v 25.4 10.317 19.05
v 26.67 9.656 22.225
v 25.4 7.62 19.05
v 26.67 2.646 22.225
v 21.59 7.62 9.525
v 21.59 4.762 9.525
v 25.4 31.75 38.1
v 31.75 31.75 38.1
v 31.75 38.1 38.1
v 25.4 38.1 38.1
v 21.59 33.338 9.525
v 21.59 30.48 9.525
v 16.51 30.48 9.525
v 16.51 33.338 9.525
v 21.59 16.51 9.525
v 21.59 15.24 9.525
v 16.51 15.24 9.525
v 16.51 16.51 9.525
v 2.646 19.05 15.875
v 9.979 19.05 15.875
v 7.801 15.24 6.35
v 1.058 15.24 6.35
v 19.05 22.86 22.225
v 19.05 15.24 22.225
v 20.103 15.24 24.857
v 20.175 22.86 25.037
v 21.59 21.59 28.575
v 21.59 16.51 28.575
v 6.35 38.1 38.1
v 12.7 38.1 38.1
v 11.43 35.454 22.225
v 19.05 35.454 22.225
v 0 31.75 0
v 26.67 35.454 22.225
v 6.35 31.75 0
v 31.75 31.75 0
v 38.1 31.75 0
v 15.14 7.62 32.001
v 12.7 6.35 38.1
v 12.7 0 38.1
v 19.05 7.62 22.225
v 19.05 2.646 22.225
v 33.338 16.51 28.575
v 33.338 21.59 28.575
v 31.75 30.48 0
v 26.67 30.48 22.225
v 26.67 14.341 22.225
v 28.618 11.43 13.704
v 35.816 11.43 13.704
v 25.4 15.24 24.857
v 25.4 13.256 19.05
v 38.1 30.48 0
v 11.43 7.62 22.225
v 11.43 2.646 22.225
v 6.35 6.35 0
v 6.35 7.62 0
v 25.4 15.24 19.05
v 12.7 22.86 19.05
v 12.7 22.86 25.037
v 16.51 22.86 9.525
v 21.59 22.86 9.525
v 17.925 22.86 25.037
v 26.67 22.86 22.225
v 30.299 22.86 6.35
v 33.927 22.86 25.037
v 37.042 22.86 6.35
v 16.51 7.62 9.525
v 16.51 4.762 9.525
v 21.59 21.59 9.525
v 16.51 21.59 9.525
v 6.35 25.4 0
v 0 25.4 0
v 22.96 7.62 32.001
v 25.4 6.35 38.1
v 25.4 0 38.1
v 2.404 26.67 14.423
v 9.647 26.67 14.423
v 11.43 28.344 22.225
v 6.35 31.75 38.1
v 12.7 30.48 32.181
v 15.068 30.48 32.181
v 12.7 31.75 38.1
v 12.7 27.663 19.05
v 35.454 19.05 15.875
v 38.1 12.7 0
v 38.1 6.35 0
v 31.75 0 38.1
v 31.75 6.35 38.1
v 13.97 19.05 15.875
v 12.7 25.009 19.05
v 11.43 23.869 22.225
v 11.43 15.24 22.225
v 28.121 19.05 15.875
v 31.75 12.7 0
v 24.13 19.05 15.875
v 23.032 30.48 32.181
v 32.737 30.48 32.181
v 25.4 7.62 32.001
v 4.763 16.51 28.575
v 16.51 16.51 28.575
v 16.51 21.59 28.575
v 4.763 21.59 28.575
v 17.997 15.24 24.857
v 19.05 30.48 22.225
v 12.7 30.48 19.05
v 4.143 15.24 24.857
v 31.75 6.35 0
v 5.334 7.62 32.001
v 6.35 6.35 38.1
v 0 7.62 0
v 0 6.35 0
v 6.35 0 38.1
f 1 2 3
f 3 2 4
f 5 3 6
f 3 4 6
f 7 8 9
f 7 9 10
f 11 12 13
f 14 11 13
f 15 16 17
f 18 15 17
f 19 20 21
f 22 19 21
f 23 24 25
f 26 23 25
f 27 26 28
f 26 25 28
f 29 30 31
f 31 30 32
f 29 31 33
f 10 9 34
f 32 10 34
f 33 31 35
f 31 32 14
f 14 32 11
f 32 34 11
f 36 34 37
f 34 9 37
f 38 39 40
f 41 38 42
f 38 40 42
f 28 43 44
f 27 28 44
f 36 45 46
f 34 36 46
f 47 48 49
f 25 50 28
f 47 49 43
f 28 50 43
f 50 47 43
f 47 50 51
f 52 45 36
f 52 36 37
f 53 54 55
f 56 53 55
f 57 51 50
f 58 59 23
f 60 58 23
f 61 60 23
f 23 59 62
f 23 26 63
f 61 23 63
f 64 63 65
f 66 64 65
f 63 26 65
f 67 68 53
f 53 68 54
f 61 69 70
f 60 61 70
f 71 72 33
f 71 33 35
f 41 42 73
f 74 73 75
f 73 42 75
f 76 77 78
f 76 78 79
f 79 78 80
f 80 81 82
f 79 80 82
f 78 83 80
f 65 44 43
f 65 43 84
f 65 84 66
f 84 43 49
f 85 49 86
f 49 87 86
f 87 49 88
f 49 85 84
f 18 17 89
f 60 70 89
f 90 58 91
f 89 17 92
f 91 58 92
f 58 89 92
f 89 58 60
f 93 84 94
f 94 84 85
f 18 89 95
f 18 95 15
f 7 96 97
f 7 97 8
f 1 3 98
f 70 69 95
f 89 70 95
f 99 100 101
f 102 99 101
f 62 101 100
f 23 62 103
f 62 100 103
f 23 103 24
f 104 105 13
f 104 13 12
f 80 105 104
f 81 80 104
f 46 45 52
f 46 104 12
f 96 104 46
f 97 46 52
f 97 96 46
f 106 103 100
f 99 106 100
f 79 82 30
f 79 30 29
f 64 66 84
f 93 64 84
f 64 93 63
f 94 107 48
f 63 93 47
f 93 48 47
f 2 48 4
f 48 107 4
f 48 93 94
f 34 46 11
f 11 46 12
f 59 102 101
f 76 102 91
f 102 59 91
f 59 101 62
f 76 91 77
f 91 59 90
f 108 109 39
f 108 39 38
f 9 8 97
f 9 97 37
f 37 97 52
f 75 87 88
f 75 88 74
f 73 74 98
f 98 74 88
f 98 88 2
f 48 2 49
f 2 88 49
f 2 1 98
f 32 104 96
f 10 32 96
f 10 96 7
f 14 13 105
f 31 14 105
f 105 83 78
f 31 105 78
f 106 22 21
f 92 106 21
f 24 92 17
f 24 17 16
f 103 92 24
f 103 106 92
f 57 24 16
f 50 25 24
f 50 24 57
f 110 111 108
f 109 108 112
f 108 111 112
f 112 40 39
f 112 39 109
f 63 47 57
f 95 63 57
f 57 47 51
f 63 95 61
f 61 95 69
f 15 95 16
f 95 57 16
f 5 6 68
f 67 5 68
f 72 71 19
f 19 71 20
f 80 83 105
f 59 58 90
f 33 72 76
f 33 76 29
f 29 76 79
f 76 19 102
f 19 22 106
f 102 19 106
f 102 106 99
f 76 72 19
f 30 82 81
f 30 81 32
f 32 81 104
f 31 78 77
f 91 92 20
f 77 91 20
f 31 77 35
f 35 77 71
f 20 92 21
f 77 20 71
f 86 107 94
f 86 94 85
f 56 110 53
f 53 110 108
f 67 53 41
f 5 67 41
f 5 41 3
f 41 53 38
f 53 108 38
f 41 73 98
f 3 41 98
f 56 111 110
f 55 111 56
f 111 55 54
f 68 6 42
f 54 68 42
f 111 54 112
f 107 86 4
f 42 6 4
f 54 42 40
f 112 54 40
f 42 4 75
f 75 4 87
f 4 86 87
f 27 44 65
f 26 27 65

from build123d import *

# Parameters (mm, degrees)
F1_DEPTH = 38.1
F6_DEPTH = 38.1
F7_DEPTH = 38.1
F8_W     = 25.4
F8_H     = 7.62
F9_DEPTH = 38.1


with BuildPart() as f1:
    # F0 (on Front) → F1 (new body)
    with BuildSketch(Plane.XZ):
        Polygon((6.35, 38.1), (0, 0), (6.35, 0), (11.43, 22.225), (16.51, 9.525), (21.59, 9.525), (26.67, 22.225), (31.75, 0), (38.1, 0), (31.75, 38.1), (25.4, 38.1), (19.05, 22.225), (12.7, 38.1), align=None)
        Polygon((0, 38.1), (0, 0), (6.35, 38.1), align=None)
        Polygon((11.43, 22.225), (6.35, 0), (31.75, 0), (26.67, 22.225), (21.59, 9.525), (16.51, 9.525), align=None)
        Polygon((25.4, 38.1), (12.7, 38.1), (19.05, 22.225), align=None)
        Polygon((31.75, 38.1), (38.1, 0), (38.1, 38.1), align=None)
    extrude(amount=-F1_DEPTH)

    # F5 (on offset) → F6 (cut)
    with BuildSketch(Plane.YZ.offset(38.1)):
        Polygon((31.75, 38.1), (6.35, 38.1), (11.43, 13.704411), (16.51, 28.575), (21.59, 28.575), (26.67, 14.422566), align=None)
        Polygon((0, 38.1), (0, 0), (6.35, 0), align=None)
        Polygon((19.05, 15.875), (12.7, 0), (25.4, 0), align=None)
        Polygon((38.1, 0), (38.1, 38.1), (31.75, 0), align=None)
    extrude(amount=-F6_DEPTH, mode=Mode.SUBTRACT)

    # F0 (on Front) → F7 (cut)
    with BuildSketch(Plane.XZ):
        Polygon((0, 38.1), (0, 0), (6.35, 38.1), align=None)
        Polygon((25.4, 38.1), (12.7, 38.1), (19.05, 22.225), align=None)
        Polygon((31.75, 38.1), (38.1, 0), (38.1, 38.1), align=None)
        Polygon((11.43, 22.225), (6.35, 0), (31.75, 0), (26.67, 22.225), (21.59, 9.525), (16.51, 9.525), align=None)
    extrude(amount=-F7_DEPTH, mode=Mode.SUBTRACT)

    # F8 (on offset) → F9 (cut)
    with BuildSketch(Plane.XY.offset(38.1)):
        with Locations((25.4, 26.67)):
            Rectangle(F8_W, F8_H)
        with Locations((12.7, 11.43)):
            Rectangle(F8_W, F8_H)
    extrude(amount=-F9_DEPTH, mode=Mode.SUBTRACT)


solid = f1.part
